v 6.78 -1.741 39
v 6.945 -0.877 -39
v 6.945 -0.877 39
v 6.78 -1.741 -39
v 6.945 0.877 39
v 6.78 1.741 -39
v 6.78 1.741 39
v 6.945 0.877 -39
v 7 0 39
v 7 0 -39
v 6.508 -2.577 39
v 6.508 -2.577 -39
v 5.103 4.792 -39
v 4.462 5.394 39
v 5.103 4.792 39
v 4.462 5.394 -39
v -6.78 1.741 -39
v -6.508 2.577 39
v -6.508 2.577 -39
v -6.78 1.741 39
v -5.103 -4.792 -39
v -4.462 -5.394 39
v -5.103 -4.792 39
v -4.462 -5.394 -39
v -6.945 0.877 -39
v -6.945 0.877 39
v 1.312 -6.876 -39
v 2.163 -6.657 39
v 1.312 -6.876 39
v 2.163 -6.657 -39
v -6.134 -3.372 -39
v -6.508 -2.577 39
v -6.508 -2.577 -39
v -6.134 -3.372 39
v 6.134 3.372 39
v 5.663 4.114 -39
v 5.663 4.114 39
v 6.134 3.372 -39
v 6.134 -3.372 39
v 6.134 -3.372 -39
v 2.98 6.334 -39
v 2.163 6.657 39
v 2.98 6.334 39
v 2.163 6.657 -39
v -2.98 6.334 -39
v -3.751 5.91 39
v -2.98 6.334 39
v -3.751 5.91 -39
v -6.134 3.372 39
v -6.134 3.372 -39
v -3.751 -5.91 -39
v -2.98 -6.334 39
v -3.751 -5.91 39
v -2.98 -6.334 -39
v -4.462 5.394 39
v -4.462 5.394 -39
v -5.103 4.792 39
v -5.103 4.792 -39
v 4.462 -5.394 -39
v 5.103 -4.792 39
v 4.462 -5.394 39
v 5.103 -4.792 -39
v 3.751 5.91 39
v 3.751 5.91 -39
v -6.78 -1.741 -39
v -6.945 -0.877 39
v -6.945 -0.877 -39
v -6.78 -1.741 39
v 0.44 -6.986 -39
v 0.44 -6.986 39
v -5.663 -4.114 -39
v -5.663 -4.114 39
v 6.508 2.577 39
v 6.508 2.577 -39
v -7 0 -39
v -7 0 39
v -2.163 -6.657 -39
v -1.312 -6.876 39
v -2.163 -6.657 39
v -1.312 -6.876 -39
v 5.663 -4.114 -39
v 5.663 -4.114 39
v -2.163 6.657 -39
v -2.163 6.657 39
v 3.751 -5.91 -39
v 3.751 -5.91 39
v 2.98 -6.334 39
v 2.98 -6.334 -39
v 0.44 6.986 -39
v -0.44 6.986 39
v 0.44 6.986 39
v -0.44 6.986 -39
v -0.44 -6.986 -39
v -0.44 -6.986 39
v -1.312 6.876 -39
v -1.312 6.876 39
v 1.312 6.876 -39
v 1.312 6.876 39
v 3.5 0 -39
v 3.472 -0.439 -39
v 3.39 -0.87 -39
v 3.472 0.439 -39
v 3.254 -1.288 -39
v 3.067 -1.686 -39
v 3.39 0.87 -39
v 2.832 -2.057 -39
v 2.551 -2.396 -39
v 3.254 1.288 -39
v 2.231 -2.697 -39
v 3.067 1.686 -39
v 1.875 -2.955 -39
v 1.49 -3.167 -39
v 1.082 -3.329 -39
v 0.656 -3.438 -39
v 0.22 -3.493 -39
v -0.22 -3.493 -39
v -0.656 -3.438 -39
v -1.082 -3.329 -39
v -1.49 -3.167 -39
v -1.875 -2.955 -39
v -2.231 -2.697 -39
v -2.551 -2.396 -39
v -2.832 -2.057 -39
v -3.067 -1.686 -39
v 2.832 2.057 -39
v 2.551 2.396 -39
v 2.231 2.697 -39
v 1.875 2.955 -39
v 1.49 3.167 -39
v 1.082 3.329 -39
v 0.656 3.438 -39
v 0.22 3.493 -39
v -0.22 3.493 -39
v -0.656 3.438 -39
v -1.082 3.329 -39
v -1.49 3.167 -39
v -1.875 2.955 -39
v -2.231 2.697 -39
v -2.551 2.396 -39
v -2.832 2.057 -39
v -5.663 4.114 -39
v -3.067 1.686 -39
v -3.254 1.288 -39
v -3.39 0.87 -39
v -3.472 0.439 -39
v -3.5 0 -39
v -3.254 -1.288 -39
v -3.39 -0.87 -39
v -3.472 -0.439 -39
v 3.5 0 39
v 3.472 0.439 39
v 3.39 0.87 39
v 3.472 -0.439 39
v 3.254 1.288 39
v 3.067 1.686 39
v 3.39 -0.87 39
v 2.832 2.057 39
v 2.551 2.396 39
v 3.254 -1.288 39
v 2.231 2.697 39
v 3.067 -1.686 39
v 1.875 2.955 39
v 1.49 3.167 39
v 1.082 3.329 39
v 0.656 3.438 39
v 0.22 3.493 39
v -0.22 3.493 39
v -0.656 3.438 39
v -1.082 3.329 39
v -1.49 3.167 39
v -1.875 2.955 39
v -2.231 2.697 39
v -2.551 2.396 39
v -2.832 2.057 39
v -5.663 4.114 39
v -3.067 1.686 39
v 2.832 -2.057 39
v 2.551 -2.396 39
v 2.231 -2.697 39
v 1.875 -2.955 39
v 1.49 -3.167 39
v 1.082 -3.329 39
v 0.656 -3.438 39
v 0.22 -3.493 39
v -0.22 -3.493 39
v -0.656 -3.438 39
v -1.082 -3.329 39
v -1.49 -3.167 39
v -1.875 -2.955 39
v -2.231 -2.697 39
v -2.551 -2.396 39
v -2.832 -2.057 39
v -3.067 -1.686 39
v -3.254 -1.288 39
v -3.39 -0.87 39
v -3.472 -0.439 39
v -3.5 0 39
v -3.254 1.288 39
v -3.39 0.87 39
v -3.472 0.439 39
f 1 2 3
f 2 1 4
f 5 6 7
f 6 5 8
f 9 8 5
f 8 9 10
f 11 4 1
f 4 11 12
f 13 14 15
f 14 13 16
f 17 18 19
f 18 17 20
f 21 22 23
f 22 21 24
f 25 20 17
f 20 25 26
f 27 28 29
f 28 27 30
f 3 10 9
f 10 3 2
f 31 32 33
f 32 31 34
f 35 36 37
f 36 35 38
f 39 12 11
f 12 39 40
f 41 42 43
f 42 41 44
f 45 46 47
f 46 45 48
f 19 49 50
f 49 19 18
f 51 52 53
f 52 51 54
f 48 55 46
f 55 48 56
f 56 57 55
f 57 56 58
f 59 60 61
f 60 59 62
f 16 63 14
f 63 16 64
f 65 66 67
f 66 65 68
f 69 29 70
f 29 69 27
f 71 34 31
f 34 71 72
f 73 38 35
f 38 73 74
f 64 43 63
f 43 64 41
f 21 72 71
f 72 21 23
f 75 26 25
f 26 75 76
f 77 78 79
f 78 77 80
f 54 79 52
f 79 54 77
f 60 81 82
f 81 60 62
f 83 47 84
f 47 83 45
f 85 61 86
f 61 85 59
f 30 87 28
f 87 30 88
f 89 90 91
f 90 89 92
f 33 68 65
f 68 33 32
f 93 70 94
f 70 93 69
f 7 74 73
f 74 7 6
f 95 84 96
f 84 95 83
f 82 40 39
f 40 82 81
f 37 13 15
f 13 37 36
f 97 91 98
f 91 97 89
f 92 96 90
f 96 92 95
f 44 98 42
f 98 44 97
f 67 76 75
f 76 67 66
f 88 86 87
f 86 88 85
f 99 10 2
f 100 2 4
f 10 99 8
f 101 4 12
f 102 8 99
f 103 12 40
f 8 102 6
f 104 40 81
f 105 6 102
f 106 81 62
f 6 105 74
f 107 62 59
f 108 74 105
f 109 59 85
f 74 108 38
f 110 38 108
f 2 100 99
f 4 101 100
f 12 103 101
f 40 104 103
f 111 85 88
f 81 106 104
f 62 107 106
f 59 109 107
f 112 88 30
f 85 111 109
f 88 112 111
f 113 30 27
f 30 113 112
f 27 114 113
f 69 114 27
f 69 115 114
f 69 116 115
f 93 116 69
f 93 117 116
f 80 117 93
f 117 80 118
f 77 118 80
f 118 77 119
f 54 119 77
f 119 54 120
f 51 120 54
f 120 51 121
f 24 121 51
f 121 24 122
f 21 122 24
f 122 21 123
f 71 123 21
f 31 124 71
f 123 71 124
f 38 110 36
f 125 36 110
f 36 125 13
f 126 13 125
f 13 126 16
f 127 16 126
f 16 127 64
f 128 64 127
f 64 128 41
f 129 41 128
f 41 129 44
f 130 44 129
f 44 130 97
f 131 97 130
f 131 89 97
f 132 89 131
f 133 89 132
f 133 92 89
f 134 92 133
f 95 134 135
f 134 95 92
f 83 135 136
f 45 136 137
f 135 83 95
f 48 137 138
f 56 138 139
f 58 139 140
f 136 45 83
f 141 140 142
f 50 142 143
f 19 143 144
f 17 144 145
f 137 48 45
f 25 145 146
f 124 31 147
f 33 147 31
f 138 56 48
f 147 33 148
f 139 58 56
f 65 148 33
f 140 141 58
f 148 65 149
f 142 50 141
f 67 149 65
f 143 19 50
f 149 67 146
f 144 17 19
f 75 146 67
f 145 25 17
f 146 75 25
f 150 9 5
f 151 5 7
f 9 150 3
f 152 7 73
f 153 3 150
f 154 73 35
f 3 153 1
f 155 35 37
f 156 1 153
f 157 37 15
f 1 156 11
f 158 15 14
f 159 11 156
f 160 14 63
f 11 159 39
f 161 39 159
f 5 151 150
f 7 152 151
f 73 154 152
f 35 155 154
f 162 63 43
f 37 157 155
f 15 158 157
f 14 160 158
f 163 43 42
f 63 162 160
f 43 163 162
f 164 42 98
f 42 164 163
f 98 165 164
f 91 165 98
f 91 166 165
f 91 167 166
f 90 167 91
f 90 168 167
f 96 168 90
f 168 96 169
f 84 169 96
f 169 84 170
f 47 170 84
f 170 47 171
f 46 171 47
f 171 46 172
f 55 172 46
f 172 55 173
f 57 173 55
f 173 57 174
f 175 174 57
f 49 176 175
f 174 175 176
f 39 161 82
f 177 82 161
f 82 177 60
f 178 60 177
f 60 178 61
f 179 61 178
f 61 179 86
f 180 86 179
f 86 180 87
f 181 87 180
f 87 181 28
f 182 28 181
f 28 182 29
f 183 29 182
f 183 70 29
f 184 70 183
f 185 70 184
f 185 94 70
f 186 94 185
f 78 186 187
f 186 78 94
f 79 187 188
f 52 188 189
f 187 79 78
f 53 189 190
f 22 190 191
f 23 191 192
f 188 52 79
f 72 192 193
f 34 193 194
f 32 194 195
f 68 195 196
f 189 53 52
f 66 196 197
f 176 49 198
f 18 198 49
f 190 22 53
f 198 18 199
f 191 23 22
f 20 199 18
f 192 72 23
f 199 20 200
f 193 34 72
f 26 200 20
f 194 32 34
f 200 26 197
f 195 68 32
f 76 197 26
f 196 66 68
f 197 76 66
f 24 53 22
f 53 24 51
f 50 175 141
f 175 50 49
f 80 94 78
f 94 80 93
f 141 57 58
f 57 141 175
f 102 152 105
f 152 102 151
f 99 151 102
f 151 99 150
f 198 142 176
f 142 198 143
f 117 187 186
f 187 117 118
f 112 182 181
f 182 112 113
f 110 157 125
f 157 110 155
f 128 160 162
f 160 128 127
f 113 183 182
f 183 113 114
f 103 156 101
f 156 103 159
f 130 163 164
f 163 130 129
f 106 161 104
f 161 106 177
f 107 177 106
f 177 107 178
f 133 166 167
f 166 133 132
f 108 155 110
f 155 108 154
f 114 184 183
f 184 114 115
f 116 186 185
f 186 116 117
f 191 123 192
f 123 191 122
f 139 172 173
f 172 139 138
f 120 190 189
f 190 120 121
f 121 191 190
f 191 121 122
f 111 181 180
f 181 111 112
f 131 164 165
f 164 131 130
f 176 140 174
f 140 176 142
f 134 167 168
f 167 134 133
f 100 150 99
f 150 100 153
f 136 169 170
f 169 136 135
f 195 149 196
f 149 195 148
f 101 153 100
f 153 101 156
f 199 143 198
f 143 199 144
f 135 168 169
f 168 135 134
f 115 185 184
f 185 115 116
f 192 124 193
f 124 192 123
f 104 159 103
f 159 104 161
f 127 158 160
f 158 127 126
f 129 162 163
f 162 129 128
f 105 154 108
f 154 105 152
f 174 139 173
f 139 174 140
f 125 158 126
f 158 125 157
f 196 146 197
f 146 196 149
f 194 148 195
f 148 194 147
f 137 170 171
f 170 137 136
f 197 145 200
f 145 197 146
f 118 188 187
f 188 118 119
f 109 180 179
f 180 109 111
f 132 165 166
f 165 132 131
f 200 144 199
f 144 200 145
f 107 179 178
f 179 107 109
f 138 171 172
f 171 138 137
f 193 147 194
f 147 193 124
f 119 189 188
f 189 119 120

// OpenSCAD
$fn = 50;


difference() {
	union() {
		translate(v = [0, 0, -39.0000000000]) {
			cylinder(h = 78, r = 7.0000000000);
		}
	}
	union() {
		translate(v = [0, 0, -100.0000000000]) {
			cylinder(h = 200, r = 3.5000000000);
		}
	}
}
